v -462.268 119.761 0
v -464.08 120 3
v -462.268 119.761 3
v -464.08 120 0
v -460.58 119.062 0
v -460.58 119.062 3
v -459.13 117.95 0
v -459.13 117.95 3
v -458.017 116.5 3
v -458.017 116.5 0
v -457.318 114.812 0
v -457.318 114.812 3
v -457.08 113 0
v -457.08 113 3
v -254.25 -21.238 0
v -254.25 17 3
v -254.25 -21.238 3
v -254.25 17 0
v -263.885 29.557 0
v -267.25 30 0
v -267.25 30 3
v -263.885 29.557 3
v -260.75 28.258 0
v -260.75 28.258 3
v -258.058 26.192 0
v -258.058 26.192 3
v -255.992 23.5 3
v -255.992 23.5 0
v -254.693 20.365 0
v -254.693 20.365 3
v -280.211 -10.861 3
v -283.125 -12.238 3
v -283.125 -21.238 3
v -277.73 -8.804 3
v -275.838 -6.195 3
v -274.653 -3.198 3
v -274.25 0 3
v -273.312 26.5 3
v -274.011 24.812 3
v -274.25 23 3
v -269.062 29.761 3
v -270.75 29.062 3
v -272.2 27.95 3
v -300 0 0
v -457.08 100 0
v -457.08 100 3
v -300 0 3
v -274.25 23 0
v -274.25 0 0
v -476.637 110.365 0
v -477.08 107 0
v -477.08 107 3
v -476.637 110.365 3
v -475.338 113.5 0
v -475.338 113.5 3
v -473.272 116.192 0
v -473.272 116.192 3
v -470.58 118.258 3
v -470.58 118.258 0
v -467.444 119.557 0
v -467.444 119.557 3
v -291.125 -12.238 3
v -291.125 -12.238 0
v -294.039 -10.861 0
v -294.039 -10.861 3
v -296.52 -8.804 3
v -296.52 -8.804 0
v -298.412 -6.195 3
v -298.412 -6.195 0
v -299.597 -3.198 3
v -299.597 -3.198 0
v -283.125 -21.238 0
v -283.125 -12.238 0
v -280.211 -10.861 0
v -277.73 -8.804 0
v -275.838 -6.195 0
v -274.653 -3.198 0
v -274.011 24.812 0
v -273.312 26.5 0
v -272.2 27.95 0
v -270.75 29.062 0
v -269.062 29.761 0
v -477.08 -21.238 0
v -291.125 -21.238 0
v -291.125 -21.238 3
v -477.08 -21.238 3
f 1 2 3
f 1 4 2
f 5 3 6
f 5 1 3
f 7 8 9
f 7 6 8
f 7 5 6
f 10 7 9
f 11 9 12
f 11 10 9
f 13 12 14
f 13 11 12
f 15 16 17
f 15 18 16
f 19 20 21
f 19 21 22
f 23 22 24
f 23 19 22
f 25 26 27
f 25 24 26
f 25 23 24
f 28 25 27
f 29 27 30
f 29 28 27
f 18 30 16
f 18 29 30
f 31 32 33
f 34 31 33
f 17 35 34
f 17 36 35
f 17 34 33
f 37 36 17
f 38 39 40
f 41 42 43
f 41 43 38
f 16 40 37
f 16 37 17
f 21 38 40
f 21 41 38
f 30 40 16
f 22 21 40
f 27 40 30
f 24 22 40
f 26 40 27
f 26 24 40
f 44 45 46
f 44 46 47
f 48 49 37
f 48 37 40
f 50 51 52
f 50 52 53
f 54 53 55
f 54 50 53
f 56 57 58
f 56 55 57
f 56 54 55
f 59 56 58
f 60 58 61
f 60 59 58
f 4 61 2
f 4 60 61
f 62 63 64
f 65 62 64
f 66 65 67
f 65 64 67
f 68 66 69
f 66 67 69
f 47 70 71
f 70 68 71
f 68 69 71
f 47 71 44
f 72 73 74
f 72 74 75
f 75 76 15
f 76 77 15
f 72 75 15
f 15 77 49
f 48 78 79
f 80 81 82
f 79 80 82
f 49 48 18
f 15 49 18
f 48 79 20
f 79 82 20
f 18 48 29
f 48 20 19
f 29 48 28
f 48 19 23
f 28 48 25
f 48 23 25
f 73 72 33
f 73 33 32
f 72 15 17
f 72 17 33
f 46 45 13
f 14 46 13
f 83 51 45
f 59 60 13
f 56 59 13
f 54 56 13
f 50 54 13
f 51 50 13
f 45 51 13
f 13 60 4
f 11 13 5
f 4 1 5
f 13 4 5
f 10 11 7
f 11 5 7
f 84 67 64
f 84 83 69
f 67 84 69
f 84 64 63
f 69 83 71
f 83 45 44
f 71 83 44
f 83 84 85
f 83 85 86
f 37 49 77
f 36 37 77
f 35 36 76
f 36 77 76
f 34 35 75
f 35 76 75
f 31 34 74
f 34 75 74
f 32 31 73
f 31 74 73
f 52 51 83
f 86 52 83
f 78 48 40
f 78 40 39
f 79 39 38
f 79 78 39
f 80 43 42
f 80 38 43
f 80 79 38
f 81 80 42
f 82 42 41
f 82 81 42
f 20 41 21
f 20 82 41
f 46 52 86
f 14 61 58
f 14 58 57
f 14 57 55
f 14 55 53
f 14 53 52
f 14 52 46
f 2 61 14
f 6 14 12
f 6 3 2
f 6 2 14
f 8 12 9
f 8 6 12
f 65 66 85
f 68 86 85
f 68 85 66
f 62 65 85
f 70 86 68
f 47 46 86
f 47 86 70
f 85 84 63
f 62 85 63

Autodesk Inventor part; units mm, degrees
ref_plane "YZ Plane" through (0, 0, 0) normal (1, 0, 0) x (0, 1, 0)
ref_plane "XZ Plane" through (0, 0, 0) normal (0, 1, 0) x (-1, 0, 0)
ref_plane "XY Plane" through (0, 0, 0) normal (0, 0, 1) x (1, 0, 0)
sketch "Sketch3" plane through (0, 0, 0) normal (0, 0, 1) x (1, 0, 0)
  circle A0 centre (368.0481, 50) radius 50 construction
  line L0 (368.0481, 0) -> (514.9541, 0) construction
  line L1 (368.0481, 50) -> (514.9541, 50) construction
  line L2 (368.0481, 100) -> (514.9541, 100) construction
  line L3 (368.0481, 50) -> (343.0481, 6.6987) construction
  line L4 (368.0481, 50) -> (324.7469, 25) construction
  line L5 (368.0481, 50) -> (324.7469, 75) construction
  line L6 (343.0481, 93.3013) -> (368.0481, 50) construction
  line L7 (393.0481, 93.3013) -> (368.0481, 50) construction
  line L8 (411.3494, 75) -> (368.0481, 50) construction
  line L9 (411.3494, 25) -> (368.0481, 50) construction
  line L10 (393.0481, 6.6987) -> (368.0481, 50) construction
  line L11 (368.0481, 0) -> (368.0481, 100) construction
  line L12 (418.0481, 50) -> (368.0481, 50) construction
  line L13 (341.8682, 0) -> (341.8682, 100) construction
  line L14 (315.6883, 0) -> (315.6883, 100) construction
  line L15 (289.5083, 0) -> (289.5083, 100) construction
  line L16 (263.3284, 0) -> (263.3284, 100) construction
  line L17 (237.1485, 0) -> (237.1485, 100) construction
  line L18 (210.9685, 0) -> (210.9685, 100) construction
  line L19 (184.7886, 0) -> (184.7886, 100) construction
  line L20 (158.6086, 0) -> (158.6086, 100) construction
  circle A1 centre (315.6883, 50) radius 50 construction
  circle A2 centre (341.8682, 50) radius 50 construction
  circle A3 centre (289.5083, 50) radius 50 construction
  circle A4 centre (263.3284, 50) radius 50 construction
  circle A5 centre (237.1485, 50) radius 50 construction
  circle A6 centre (210.9685, 50) radius 50 construction
  line L21 (393.0481, 6.6987) -> (514.9541, 6.6987) construction
  line L22 (411.3494, 25) -> (514.9541, 25) construction
  line L23 (411.3494, 75) -> (514.9541, 75) construction
  line L24 (411.3494, 75) -> (514.9541, 75) construction
  line L25 (393.0481, 93.3013) -> (514.9541, 93.3013) construction
  line L26 (358.9895, 75) -> (339.5083, 50) construction
  line L27 (339.5083, 50) -> (306.6297, 25) construction
  line L28 (306.6297, 25) -> (262.1485, 6.6987) construction
  line L29 (262.1485, 6.6987) -> (210.9685, 0) construction
  line L30 (105.4843, -12.0642) -> (105.4843, 125.3083) construction
  line L31 (25.75, 0) -> (25.75, 23)
  line L32 (45.75, 17) -> (45.75, -21.2379)
  arc A7 (32.75, 30) -> (25.75, 23) centre (32.75, 23) ccw
  arc A8 (45.75, 17) -> (32.75, 30) centre (32.75, 17) ccw
  line L33 (32.75, 17) -> (45.75, 17) construction
  line L34 (32.75, 17) -> (32.75, 30) construction
  arc A9 (0, 0) -> (8.875, -12.2379) centre (12.875, 0) ccw
  arc A10 (16.875, -12.2379) -> (25.75, 0) centre (12.875, 0) ccw
  line L35 (45.75, -21.2379) -> (16.875, -21.2379)
  line L36 (8.875, -21.2379) -> (-177.0796, -21.2379)
  circle A11 centre (-144.2046, 110.3653) radius 12.875 construction
  line L37 (8.875, -21.2379) -> (8.875, -12.2379)
  line L38 (16.875, -21.2379) -> (16.875, -12.2379)
  line L39 (411.3494, 75) -> (158.6086, 75) construction
  line L40 (368.0481, 100) -> (158.6086, 100) construction
  line L41 (418.0481, 50) -> (158.6086, 50) construction
  line L42 (411.3494, 25) -> (158.6086, 25) construction
  line L43 (393.0481, 6.6987) -> (158.6086, 6.6987) construction
  line L44 (393.0481, 93.3013) -> (158.6086, 93.3013) construction
  line L45 (358.9895, 75) -> (366.8682, 93.3013) construction
  line L46 (366.8682, 93.3013) -> (368.0481, 100) construction
  spline S0 degree 4 poles (-157.0796, 100) (-157.0796, 88.9946) (-147.011, 72.6811) (-131.8577, 48.7932) (-88.4777, 17.6268) (-50.0176, 3.937) (-18.8717, 0) (0, 0) knots 0 0 0 0 0 0.264547 0.457223 0.66608 1 1 1 1 1
  line L47 (-157.0796, 100) -> (-157.0796, 81.2146) construction
  line L48 (0, 0) -> (-42.8818, 0) construction
  line L49 (-157.0796, 100) -> (-157.0796, 113)
  line L50 (-144.2046, 110.3653) -> (-157.0796, 110.3653) construction
  line L51 (-147.6984, 94.0277) -> (-120.1158, 108.3975) construction
  line L52 (-157.0796, 100) -> (0, 0) construction
  circle A12 centre (-147.2046, 105.4197) radius 9.875 construction
  line L53 (-147.2046, 105.4197) -> (-157.0796, 105.4197) construction
  line L54 (-146.1623, 94.828) -> (-144.7762, 92.1674) construction
  line L55 (-144.7762, 92.1674) -> (-142.2689, 93.4736) construction
  line L56 (-177.0796, 107) -> (-177.0796, -21.2379)
  arc A13 (-157.0796, 113) -> (-164.0796, 120) centre (-164.0796, 113) ccw
  line L57 (-164.0796, 113) -> (-164.0796, 120) construction
  line L58 (-164.0796, 113) -> (-157.0796, 113) construction
  arc A14 (-164.0796, 120) -> (-177.0796, 107) centre (-164.0796, 107) ccw
  line L59 (-164.0796, 107) -> (-177.0796, 107) construction
  line L60 (-164.0796, 107) -> (-164.0796, 120) construction
  line L61 (-457.0796, 100) -> (-300, 0)
  line L62 (-757.0796, 100) -> (-757.0796, 76.4376)
  line L63 (-600, 0) -> (-652.3765, 0)
  spline S1 degree 4 poles (-757.0796, 76.4376) (-757.0796, 65.0585) (-753.7776, 47.1407) (-745.4013, 7.8331) (-693.0053, 2.4317) (-668.8587, 0) (-652.3765, 0) knots 0 0 0 0 0 0.348765 0.598765 1 1 1 1 1
  line L64 (-477.0796, 107) -> (-477.0796, -21.2379)
  arc A15 (-464.0796, 120) -> (-477.0796, 107) centre (-464.0796, 107) ccw
  arc A16 (-457.0796, 113) -> (-464.0796, 120) centre (-464.0796, 113) ccw
  line L65 (-457.0796, 100) -> (-457.0796, 113)
  circle A17 centre (-447.2046, 105.4197) radius 9.875 construction
  circle A18 centre (-444.2046, 110.3653) radius 12.875 construction
  line L66 (-457.0796, 100) -> (-300, 0) construction
  line L67 (-447.6984, 94.0277) -> (-420.1158, 108.3975) construction
  line L68 (-444.7762, 92.1674) -> (-442.2689, 93.4736) construction
  line L69 (-446.1623, 94.828) -> (-444.7762, 92.1674) construction
  line L70 (-291.125, -21.2379) -> (-477.0796, -21.2379)
  arc A19 (-300, 0) -> (-291.125, -12.2379) centre (-287.125, 0) ccw
  line L71 (-291.125, -21.2379) -> (-291.125, -12.2379)
  line L72 (-283.125, -21.2379) -> (-283.125, -12.2379)
  arc A20 (-283.125, -12.2379) -> (-274.25, 0) centre (-287.125, 0) ccw
  line L73 (-254.25, -21.2379) -> (-283.125, -21.2379)
  line L74 (-254.25, 17) -> (-254.25, -21.2379)
  line L75 (-274.25, 0) -> (-274.25, 23)
  arc A21 (-267.25, 30) -> (-274.25, 23) centre (-267.25, 23) ccw
  arc A22 (-254.25, 17) -> (-267.25, 30) centre (-267.25, 17) ccw
  line L76 (-777.0796, 107) -> (-777.0796, -21.2379)
  arc A23 (-764.0796, 120) -> (-777.0796, 107) centre (-764.0796, 107) ccw
  arc A24 (-757.0796, 113) -> (-764.0796, 120) centre (-764.0796, 113) ccw
  line L77 (-757.0796, 100) -> (-757.0796, 113)
  circle A25 centre (-747.2046, 105.4197) radius 9.875 construction
  circle A26 centre (-744.2046, 110.3653) radius 12.875 construction
  line L78 (-757.0796, 100) -> (-600, 0) construction
  line L79 (-747.6984, 94.0277) -> (-720.1158, 108.3975) construction
  line L80 (-744.7762, 92.1674) -> (-742.2689, 93.4736) construction
  line L81 (-746.1623, 94.828) -> (-744.7762, 92.1674) construction
  line L82 (-591.125, -21.2379) -> (-777.0796, -21.2379)
  arc A27 (-600, 0) -> (-591.125, -12.2379) centre (-587.125, 0) ccw
  line L83 (-591.125, -21.2379) -> (-591.125, -12.2379)
  line L84 (-583.125, -21.2379) -> (-583.125, -12.2379)
  arc A28 (-583.125, -12.2379) -> (-574.25, 0) centre (-587.125, 0) ccw
  line L85 (-554.25, -21.2379) -> (-583.125, -21.2379)
  line L86 (-554.25, 17) -> (-554.25, -21.2379)
  line L87 (-574.25, 0) -> (-574.25, 23)
  arc A29 (-567.25, 30) -> (-574.25, 23) centre (-567.25, 23) ccw
  arc A30 (-554.25, 17) -> (-567.25, 30) centre (-567.25, 17) ccw
  line L88 (32.75, -233) -> (45.75, -233) construction
  line L89 (32.75, -233) -> (32.75, -220) construction
  arc A31 (45.75, -233) -> (32.75, -220) centre (32.75, -233) ccw construction
  line L90 (25.75, -250) -> (25.75, -227) construction
  line L91 (45.75, -233) -> (45.75, -271.2379) construction
  arc A32 (16.875, -262.2379) -> (25.75, -250) centre (12.875, -250) ccw construction
  line L92 (45.75, -271.2379) -> (16.875, -271.2379) construction
  arc A33 (0, -250) -> (8.875, -262.2379) centre (12.875, -250) ccw construction
  arc A34 (32.75, -220) -> (25.75, -227) centre (32.75, -227) ccw construction
  line L93 (8.875, -271.2379) -> (-177.0796, -271.2379) construction
  line L94 (-157.0796, -150) -> (0, -250) construction
  spline S2 degree 4 poles (-157.0796, -150) (-157.0796, -161.0054) (-147.011, -177.3189) (-131.8577, -201.2068) (-88.4777, -232.3732) (-50.0176, -246.063) (-18.8717, -250) (0, -250) knots 0 0 0 0 0 0.264547 0.457223 0.66608 1 1 1 1 1 construction
  line L95 (-177.0796, -143) -> (-177.0796, -271.2379)
  line L96 (-146.1623, -155.172) -> (-144.7762, -157.8326) construction
  line L97 (-144.7762, -157.8326) -> (-142.2689, -156.5264) construction
  line L98 (-147.6984, -155.9723) -> (-120.1158, -141.6025) construction
  line L99 (-157.0796, -150) -> (-157.0796, -168.7854) construction
  line L100 (-147.2046, -144.5803) -> (-157.0796, -144.5803) construction
  line L101 (-144.2046, -139.6347) -> (-157.0796, -139.6347) construction
  circle A35 centre (-147.2046, -144.5803) radius 9.875 construction
  line L102 (0, -250) -> (-42.8818, -250) construction
  line L103 (16.875, -271.2379) -> (16.875, -262.2379) construction
  line L104 (8.875, -271.2379) -> (8.875, -262.2379) construction
  circle A36 centre (-144.2046, -139.6347) radius 12.875 construction
  line L105 (-164.0796, -143) -> (-177.0796, -143) construction
  line L106 (-157.0796, -150) -> (-157.0796, -137) construction
  line L107 (-164.0796, -137) -> (-157.0796, -137) construction
  arc A37 (-157.0796, -137) -> (-164.0796, -130) centre (-164.0796, -137) ccw
  line L108 (-164.0796, -137) -> (-164.0796, -130) construction
  line L109 (-164.0796, -143) -> (-164.0796, -130) construction
  arc A38 (-164.0796, -130) -> (-177.0796, -143) centre (-164.0796, -143) ccw
  arc A39 (32.75, -227) -> (25.75, -234) centre (32.75, -234) ccw
  line L110 (32.75, -234) -> (25.75, -234) construction
  line L111 (32.75, -234) -> (32.75, -227) construction
  line L112 (45.75, -271.2379) -> (-177.0796, -271.2379)
  arc A40 (45.75, -240) -> (32.75, -227) centre (32.75, -240) ccw
  line L113 (32.75, -240) -> (45.75, -240) construction
  line L114 (32.75, -240) -> (32.75, -227) construction
  line L115 (45.75, -240) -> (45.75, -271.2379)
  line L116 (0, -242) -> (25.75, -242)
  line L117 (25.75, -234) -> (25.75, -242)
  line L118 (-149.0796, -145.6094) -> (-149.0796, -150)
  line L119 (-149.0796, -145.6094) -> (-157.0796, -140.5164)
  line L120 (-157.0796, -140.5164) -> (-157.0796, -137)
  line L121 (57.9242, -250) -> (-50.1018, -250) construction
  spline S3 degree 4 poles (-149.0796, -150) (-149.0796, -154.1011) (-147.2668, -159.7716) (-135.8793, -178.0796) (-120.229, -197.0865) (-83.3361, -225.9308) (-47.2959, -235.9761) (-18.0598, -242) (0, -242) knots 0 0 0 0 0 0.173174 0.31592 0.488873 0.682943 1 1 1 1 1
  line L122 (-158.9844, -148.7874) -> (-160.5796, -147.7718) construction
  line L123 (-149.0796, -145.6094) -> (2.3304, -242) construction
  line L124 (-149.0796, -145.6094) -> (-139.5059, -151.7042)
  line L125 (-146.1623, -155.172) -> (-139.5059, -151.7042)
  line L126 (-144.7762, -157.8326) -> (-146.1623, -155.172)
  line L127 (-144.7762, -157.8326) -> (-136.5837, -153.5646)
  line L128 (-136.5837, -153.5646) -> (-134.053, -155.1756)
  line L129 (-136.5837, -153.5646) -> (-136.7042, -153.7538) construction
  line L130 (-134.053, -155.1756) -> (-134.1481, -155.3251) construction
  spline S4 degree 4 poles (-134.053, -155.1756) (-136.3978, -157.5109) (-136.0767, -162.1227) (-140.741, -169.8826) (-137.1035, -175.12) knots 0 0 0 0 0 1 1 1 1 1
  line L131 (-134.053, -155.1756) -> (-131.4385, -154.0999) construction
  line L132 (-254.25, -271.2379) -> (-477.0796, -271.2379)
  line L133 (-477.0796, -143) -> (-477.0796, -271.2379)
  arc A41 (-464.0796, -130) -> (-477.0796, -143) centre (-464.0796, -143) ccw
  arc A42 (-457.0796, -137) -> (-464.0796, -130) centre (-464.0796, -137) ccw
  line L134 (-457.0796, -140.5164) -> (-457.0796, -137)
  line L135 (-449.0796, -145.6094) -> (-457.0796, -140.5164)
  line L136 (-449.0796, -145.6094) -> (-439.5059, -151.7042)
  line L137 (-446.1623, -155.172) -> (-439.5059, -151.7042)
  line L138 (-444.7762, -157.8326) -> (-446.1623, -155.172)
  line L139 (-444.7762, -157.8326) -> (-436.5837, -153.5646)
  line L140 (-436.5837, -153.5646) -> (-434.053, -155.1756)
  line L141 (-449.0796, -145.6094) -> (-297.6696, -242) construction
  line L142 (-300, -242) -> (-274.25, -242)
  line L143 (-274.25, -234) -> (-274.25, -242)
  arc A43 (-267.25, -227) -> (-274.25, -234) centre (-267.25, -234) ccw
  arc A44 (-254.25, -240) -> (-267.25, -227) centre (-267.25, -240) ccw
  line L144 (-254.25, -240) -> (-254.25, -271.2379)
  circle A45 centre (-447.2046, -144.5803) radius 9.875 construction
  line L145 (-457.0796, -150) -> (-300, -250) construction
  circle A46 centre (-444.2046, -139.6347) radius 12.875 construction
  line L146 (-554.25, -271.2379) -> (-777.0796, -271.2379)
  line L147 (-777.0796, -143) -> (-777.0796, -271.2379)
  arc A47 (-764.0796, -130) -> (-777.0796, -143) centre (-764.0796, -143) ccw
  arc A48 (-757.0796, -137) -> (-764.0796, -130) centre (-764.0796, -137) ccw
  line L148 (-757.0796, -140.5164) -> (-757.0796, -137)
  line L149 (-749.0796, -145.6094) -> (-757.0796, -140.5164)
  line L150 (-749.0796, -145.6094) -> (-739.5059, -151.7042)
  line L151 (-746.1623, -155.172) -> (-739.5059, -151.7042)
  line L152 (-744.7762, -157.8326) -> (-746.1623, -155.172)
  line L153 (-744.7762, -157.8326) -> (-736.5837, -153.5646)
  line L154 (-736.5837, -153.5646) -> (-734.053, -155.1756)
  line L155 (-749.0796, -145.6094) -> (-597.6696, -242) construction
  line L156 (-600, -242) -> (-574.25, -242)
  line L157 (-574.25, -234) -> (-574.25, -242)
  arc A49 (-567.25, -227) -> (-574.25, -234) centre (-567.25, -234) ccw
  arc A50 (-554.25, -240) -> (-567.25, -227) centre (-567.25, -240) ccw
  line L158 (-554.25, -240) -> (-554.25, -271.2379)
  circle A51 centre (-747.2046, -144.5803) radius 9.875 construction
  line L159 (-757.0796, -150) -> (-600, -250) construction
  circle A52 centre (-744.2046, -139.6347) radius 12.875 construction
  line L160 (-297.6696, -242) -> (-434.053, -155.1756)
  spline S5 degree 4 poles (-757.0796, -173.5624) (-757.0796, -184.9415) (-753.7776, -202.8593) (-745.4013, -242.1669) (-693.0053, -247.5683) (-668.8587, -250) (-652.3765, -250) knots 0 0 0 0 0 0.348765 0.598765 1 1 1 1 1 construction
  line L161 (-757.0796, -150) -> (-757.0796, -173.5624)
  line L162 (-600, -250) -> (-652.3765, -250) construction
  line L163 (-600, -242) -> (-652.3765, -242)
  spline S6 degree 4 poles (-749.0796, -173.5624) (-749.0796, -183.7991) (-746.0176, -199.7502) (-737.9559, -236.335) (-690.8375, -239.2991) (-667.8077, -242) (-652.3765, -242) knots 0 0 0 0 0 0.346383 0.596383 1 1 1 1 1
  line L164 (-749.0796, -173.5624) -> (-749.0796, -170.035) construction
  spline S7 degree 3 poles (-734.053, -155.1756) (-737.3391, -159.7493) (-749.7015, -168.8592) (-748.818, -180.0805) knots 0 0 0 0 1 1 1 1
  point P0 (158.6086, 0)
  point P1 (-148.021, 75)
  point P2 (-128.5398, 50)
  point P3 (-95.6611, 25)
  point P4 (-51.1799, 6.6987)
  point P5 (-155.8997, 93.3013)
  point P6 (-753.2027, 48.1984)
  point P7 (-737.7866, 19.9116)
  point P8 (-697.6619, 3.8098)
  point P9 (-457.0796, 110.3653)
  point P10 (-457.0796, 105.4197)
  point P11 (-757.0796, 110.3653)
  point P12 (-757.0796, 105.4197)
  point P13 (-51.1799, -243.3013)
  point P14 (-95.6611, -225)
  point P15 (-148.021, -175)
  point P16 (-128.5398, -200)
  point P17 (-155.8997, -156.6987)
  point P18 (-157.0796, -141.4334)
  point P19 (-153.0796, -143.0629)
  point P20 (-152.1421, -144.5803)
  point P21 (3.9112, -250)
  point P22 (-147.2046, -158.2164)
  point P23 (-137.7547, -174.1759)
  point P24 (-121.904, -193.5196)
  point P25 (-91.5665, -216.9339)
  point P26 (-48.8291, -234.4712)
  point P27 (-135.7587, -158.2929)
  point P28 (-137.8231, -165.6206)
  point P29 (-453.0796, -143.0629)
  point P30 (-457.0796, -144.5803)
  point P31 (-447.6984, -155.9723)
  point P32 (-457.0796, -139.6347)
  point P33 (-753.0796, -143.0629)
  point P34 (-757.0796, -144.5803)
  point P35 (-747.6984, -155.9723)
  point P36 (-757.0796, -139.6347)
  point P37 (-753.2027, -201.8016)
  point P38 (-737.7866, -230.0884)
  point P39 (-697.6619, -246.1902)
  point P40 (-745.4939, -198.9007)
  point P41 (-731.3987, -224.5882)
  point P42 (-695.3384, -238.4632)
  point P43 (-741.9679, -163.8836)
  point P44 (-300, 0)
  dimension "d43" = 25.75
  dimension "d53" = 19.75
  dimension "diameter" = 100
  dimension "d8" = 26.1799
  dimension "d14" = 30
  dimension "d15" = 30
  dimension "d16" = 30
  dimension "d26" = 90
  dimension "stopper" = 30
  dimension "stopperthickness" = 20
  dimension "d32" = 12.875
  dimension "d33" = 12.875
  dimension "d38" = 6
  dimension "d47" = 8
  dimension "d49" = 9
  dimension "d55" = 120
  dimension "d56" = 3
  dimension "d57" = 90
  dimension "d58" = 90
  dimension "d59" = 20
  dimension "d60" = 6
  dimension "d61" = 20
  dimension "d62" = 28.875
  dimension "d72" = 300
  dimension "d93" = 250
  dimension "d98" = 90
  dimension "d99" = 44.2379
  dimension "d100" = 37.2379
  dimension "d101" = 90
  dimension "railheight" = 8
  dimension "d104" = 8
  dimension "d105" = 8
  dimension "d106" = 3
  dimension "d109" = 300
  dimension "d116" = 250
  dimension "d121" = 8
extrude "Extrusion1" add sketch "Sketch3" along normal blind 3 contours L61 A19 L71 L70 L64 A15 A16 L65 | L72 A20 L75 A21 A22 L74 L73
equation "\"d8\" = 0.261799 * diameter"
properties part number "line-path"
